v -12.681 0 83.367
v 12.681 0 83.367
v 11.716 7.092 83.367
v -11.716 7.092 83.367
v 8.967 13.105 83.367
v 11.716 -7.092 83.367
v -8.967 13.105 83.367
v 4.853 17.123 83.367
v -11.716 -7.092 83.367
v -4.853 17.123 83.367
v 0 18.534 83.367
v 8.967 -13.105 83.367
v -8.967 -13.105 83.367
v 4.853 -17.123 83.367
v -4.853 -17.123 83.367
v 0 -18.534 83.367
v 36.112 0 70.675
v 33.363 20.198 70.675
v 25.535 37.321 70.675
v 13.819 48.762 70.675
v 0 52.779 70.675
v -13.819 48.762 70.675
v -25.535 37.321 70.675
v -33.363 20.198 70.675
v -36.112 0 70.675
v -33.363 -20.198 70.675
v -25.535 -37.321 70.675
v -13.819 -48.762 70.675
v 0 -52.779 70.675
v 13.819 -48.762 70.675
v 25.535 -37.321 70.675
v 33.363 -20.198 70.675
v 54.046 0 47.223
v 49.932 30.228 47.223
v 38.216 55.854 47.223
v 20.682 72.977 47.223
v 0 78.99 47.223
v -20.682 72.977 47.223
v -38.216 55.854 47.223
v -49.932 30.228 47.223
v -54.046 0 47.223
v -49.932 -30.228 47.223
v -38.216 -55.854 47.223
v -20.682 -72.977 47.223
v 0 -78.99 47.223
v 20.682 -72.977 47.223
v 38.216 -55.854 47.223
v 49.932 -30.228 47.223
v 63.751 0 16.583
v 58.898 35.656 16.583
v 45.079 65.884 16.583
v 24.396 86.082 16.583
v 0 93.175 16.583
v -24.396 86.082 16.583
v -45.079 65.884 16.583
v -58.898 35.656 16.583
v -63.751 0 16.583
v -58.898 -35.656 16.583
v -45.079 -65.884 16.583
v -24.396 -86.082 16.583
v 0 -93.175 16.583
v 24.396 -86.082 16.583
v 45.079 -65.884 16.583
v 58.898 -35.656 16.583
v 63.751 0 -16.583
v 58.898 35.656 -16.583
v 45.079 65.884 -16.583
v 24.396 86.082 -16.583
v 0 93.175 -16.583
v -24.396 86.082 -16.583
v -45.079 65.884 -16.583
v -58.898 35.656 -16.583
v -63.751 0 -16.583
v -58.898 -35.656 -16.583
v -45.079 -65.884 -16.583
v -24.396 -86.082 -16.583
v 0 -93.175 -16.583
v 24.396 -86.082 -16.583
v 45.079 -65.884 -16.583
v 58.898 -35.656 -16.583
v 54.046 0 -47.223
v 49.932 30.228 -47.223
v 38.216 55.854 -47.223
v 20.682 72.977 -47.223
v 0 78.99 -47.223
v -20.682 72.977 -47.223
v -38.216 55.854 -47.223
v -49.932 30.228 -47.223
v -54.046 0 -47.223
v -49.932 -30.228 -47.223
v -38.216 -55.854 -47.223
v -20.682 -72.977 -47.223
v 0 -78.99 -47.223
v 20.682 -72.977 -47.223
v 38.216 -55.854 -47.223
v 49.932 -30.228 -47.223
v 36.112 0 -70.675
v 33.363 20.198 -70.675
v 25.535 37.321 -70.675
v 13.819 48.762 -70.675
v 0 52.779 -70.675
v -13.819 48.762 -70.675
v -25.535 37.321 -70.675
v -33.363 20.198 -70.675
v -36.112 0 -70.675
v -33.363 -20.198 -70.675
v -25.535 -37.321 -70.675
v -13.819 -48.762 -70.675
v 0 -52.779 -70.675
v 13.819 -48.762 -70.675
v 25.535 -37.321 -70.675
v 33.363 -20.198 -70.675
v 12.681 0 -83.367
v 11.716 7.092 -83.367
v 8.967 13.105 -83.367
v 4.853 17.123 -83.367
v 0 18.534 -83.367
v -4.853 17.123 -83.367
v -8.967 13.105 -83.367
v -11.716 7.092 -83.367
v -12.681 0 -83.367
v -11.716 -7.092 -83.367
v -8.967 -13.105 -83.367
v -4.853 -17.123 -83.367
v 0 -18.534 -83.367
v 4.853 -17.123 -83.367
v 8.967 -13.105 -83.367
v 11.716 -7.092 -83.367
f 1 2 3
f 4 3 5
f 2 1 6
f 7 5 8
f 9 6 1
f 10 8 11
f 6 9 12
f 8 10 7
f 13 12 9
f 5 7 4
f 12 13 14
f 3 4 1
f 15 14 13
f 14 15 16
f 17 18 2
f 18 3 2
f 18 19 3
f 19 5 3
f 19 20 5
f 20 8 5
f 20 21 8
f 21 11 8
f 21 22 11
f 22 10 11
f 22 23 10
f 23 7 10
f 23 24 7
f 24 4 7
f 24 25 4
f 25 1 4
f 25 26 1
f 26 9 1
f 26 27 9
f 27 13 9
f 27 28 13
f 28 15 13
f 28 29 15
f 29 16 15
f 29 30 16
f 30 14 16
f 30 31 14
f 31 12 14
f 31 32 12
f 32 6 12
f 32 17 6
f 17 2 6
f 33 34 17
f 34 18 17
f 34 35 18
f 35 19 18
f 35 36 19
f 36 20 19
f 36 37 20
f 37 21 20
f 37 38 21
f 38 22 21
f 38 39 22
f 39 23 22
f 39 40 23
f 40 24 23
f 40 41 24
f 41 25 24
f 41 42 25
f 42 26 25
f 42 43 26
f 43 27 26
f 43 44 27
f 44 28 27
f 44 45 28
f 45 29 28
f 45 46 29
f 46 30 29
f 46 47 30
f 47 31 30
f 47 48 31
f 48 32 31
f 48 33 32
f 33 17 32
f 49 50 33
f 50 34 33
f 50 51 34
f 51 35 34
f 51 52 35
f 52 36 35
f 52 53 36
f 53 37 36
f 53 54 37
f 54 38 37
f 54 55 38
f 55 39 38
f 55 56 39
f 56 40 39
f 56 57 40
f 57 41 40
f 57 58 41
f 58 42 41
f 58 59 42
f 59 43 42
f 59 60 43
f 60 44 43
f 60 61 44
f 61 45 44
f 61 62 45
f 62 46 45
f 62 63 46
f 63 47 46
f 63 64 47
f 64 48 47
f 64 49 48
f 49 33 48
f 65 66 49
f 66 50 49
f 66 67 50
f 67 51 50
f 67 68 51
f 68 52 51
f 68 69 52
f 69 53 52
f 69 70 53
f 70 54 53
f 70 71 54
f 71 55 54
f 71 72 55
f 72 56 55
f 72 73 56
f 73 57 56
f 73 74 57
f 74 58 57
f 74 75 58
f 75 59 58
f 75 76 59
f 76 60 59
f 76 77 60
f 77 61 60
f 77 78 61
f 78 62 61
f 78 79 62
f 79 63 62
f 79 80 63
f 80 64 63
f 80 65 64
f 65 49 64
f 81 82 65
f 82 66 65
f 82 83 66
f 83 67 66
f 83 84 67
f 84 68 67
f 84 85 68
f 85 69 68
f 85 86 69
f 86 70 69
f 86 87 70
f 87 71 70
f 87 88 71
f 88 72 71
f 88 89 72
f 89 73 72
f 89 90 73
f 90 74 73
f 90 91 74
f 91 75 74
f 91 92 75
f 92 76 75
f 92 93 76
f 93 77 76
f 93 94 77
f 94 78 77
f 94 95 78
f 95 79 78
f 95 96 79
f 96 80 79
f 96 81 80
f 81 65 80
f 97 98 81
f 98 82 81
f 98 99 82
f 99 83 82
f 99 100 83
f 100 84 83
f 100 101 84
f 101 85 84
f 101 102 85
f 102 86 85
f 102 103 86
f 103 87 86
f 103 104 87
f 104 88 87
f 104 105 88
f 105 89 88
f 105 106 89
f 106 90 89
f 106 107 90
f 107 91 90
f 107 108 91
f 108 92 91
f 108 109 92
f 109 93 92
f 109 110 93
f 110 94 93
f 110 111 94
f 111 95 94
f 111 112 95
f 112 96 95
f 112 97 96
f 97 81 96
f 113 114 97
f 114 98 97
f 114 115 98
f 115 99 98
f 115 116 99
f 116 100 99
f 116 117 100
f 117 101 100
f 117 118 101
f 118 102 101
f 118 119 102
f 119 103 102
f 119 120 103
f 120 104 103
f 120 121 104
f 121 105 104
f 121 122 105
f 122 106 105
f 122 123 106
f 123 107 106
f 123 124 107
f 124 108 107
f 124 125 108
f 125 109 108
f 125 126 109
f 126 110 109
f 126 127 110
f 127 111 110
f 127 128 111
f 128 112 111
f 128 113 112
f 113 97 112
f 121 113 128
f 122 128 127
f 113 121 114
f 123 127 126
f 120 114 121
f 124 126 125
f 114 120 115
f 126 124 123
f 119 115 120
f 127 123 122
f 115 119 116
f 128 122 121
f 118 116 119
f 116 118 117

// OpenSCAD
// Generated by SolidPython 1.0.1 on 2020-07-29 00:46:51


scale(v = [13, 19, 17]) {
	sphere(r = 5);
}
/***********************************************
*********      SolidPython code:      **********
************************************************
 
# import packages: SolidPython
from solid import *
from solid.utils import *
from itertools import chain, combinations, permutations


class Resize:

    def __init__(self, scad_file):
        self.scad_file = scad_file
        #self.scad_file = import_scad(scad_file)
        # cone/cylinder param:
        self.r1 = 0
        self.r2 = 0
        self.h = 0
        # rectangular prism param:
        self.w = 0
        self.l = 0
        # ellipse param:
        self.r = 0

    # import OpenScad code (file name corresponds to shape)


    # classify shape + parameters
    def assign(self, param1, param2, param3):
        if self.scad_file == 'cone.scad':
            self.r1 = param1
            self.r2 = param2
            self.h = param3
        elif self.scad_file == 'cylinder.scad':
            self.r1 = param1
            self.r2 = param2
            self.h = param3
        elif self.scad_file == 'rectangularPrism.scad':
            self.h = param1
            self.l = param2
            self.w = param3
        else:
            self.r = param1
            self.h = param2

    # resize parameters
    def iterate(self):
        x = range(3, 20, 2)
        i = 1
        if self.scad_file == 'cone.scad':
            tempList = list(permutations(x, 2))
            for temp in tempList:
                param1 = temp[0]
                param2 = temp[1]
                filepath = 'produced_scad_files/' + 'cone' + str(param1) + '_' + str(param2) + '_' + '.scad'
                scad_render_to_file(cylinder(h=param1, r1=param2, r2=0), filepath)

        elif self.scad_file == 'cylinder.scad':
            tempList = list(permutations(x, 3))
            for temp in tempList:
                param1 = temp[0]
                param2 = temp[1]
                filepath = 'produced_scad_files/' + 'cylinder' + str(param1) + '_' + str(param2) + '_' + '.scad'
                scad_render_to_file(cylinder(h=param1, r1=param2, r2=param2), filepath)

        elif self.scad_file == 'rectangularPrism.scad':
            tempList = list(permutations(x, 3))
            for temp in tempList:
                param1 = temp[0]
                param2 = temp[1]
                param3 = temp[2]
                filepath = 'produced_scad_files/' + 'rectangularPrism' + str(param1) + '_' + str(param2) + '_' + str(
                    param3) + '.scad'
                scad_render_to_file(cube(size=(param1, param2, param3)), filepath)

        elif self.scad_file == 'ellipse.scad':
            tempList = list(permutations(x, 4))
            for temp in tempList:
                param1 = temp[0]
                param2 = temp[1]
                param3 = temp[2]
                param4 = temp[3]
                filepath = 'produced_scad_files/' + 'ellipse' + str(param1) + '_' + str(param2) + '_' + str(param3) + '_' + str(param4) + '.scad'
                scad_render_to_file(scale([param1, param2, param3])(sphere(r=param4)), filepath)

    def render_to_scadfile(self):
        scad_render_to_file(scad, 'example.scad') 
 
************************************************/
